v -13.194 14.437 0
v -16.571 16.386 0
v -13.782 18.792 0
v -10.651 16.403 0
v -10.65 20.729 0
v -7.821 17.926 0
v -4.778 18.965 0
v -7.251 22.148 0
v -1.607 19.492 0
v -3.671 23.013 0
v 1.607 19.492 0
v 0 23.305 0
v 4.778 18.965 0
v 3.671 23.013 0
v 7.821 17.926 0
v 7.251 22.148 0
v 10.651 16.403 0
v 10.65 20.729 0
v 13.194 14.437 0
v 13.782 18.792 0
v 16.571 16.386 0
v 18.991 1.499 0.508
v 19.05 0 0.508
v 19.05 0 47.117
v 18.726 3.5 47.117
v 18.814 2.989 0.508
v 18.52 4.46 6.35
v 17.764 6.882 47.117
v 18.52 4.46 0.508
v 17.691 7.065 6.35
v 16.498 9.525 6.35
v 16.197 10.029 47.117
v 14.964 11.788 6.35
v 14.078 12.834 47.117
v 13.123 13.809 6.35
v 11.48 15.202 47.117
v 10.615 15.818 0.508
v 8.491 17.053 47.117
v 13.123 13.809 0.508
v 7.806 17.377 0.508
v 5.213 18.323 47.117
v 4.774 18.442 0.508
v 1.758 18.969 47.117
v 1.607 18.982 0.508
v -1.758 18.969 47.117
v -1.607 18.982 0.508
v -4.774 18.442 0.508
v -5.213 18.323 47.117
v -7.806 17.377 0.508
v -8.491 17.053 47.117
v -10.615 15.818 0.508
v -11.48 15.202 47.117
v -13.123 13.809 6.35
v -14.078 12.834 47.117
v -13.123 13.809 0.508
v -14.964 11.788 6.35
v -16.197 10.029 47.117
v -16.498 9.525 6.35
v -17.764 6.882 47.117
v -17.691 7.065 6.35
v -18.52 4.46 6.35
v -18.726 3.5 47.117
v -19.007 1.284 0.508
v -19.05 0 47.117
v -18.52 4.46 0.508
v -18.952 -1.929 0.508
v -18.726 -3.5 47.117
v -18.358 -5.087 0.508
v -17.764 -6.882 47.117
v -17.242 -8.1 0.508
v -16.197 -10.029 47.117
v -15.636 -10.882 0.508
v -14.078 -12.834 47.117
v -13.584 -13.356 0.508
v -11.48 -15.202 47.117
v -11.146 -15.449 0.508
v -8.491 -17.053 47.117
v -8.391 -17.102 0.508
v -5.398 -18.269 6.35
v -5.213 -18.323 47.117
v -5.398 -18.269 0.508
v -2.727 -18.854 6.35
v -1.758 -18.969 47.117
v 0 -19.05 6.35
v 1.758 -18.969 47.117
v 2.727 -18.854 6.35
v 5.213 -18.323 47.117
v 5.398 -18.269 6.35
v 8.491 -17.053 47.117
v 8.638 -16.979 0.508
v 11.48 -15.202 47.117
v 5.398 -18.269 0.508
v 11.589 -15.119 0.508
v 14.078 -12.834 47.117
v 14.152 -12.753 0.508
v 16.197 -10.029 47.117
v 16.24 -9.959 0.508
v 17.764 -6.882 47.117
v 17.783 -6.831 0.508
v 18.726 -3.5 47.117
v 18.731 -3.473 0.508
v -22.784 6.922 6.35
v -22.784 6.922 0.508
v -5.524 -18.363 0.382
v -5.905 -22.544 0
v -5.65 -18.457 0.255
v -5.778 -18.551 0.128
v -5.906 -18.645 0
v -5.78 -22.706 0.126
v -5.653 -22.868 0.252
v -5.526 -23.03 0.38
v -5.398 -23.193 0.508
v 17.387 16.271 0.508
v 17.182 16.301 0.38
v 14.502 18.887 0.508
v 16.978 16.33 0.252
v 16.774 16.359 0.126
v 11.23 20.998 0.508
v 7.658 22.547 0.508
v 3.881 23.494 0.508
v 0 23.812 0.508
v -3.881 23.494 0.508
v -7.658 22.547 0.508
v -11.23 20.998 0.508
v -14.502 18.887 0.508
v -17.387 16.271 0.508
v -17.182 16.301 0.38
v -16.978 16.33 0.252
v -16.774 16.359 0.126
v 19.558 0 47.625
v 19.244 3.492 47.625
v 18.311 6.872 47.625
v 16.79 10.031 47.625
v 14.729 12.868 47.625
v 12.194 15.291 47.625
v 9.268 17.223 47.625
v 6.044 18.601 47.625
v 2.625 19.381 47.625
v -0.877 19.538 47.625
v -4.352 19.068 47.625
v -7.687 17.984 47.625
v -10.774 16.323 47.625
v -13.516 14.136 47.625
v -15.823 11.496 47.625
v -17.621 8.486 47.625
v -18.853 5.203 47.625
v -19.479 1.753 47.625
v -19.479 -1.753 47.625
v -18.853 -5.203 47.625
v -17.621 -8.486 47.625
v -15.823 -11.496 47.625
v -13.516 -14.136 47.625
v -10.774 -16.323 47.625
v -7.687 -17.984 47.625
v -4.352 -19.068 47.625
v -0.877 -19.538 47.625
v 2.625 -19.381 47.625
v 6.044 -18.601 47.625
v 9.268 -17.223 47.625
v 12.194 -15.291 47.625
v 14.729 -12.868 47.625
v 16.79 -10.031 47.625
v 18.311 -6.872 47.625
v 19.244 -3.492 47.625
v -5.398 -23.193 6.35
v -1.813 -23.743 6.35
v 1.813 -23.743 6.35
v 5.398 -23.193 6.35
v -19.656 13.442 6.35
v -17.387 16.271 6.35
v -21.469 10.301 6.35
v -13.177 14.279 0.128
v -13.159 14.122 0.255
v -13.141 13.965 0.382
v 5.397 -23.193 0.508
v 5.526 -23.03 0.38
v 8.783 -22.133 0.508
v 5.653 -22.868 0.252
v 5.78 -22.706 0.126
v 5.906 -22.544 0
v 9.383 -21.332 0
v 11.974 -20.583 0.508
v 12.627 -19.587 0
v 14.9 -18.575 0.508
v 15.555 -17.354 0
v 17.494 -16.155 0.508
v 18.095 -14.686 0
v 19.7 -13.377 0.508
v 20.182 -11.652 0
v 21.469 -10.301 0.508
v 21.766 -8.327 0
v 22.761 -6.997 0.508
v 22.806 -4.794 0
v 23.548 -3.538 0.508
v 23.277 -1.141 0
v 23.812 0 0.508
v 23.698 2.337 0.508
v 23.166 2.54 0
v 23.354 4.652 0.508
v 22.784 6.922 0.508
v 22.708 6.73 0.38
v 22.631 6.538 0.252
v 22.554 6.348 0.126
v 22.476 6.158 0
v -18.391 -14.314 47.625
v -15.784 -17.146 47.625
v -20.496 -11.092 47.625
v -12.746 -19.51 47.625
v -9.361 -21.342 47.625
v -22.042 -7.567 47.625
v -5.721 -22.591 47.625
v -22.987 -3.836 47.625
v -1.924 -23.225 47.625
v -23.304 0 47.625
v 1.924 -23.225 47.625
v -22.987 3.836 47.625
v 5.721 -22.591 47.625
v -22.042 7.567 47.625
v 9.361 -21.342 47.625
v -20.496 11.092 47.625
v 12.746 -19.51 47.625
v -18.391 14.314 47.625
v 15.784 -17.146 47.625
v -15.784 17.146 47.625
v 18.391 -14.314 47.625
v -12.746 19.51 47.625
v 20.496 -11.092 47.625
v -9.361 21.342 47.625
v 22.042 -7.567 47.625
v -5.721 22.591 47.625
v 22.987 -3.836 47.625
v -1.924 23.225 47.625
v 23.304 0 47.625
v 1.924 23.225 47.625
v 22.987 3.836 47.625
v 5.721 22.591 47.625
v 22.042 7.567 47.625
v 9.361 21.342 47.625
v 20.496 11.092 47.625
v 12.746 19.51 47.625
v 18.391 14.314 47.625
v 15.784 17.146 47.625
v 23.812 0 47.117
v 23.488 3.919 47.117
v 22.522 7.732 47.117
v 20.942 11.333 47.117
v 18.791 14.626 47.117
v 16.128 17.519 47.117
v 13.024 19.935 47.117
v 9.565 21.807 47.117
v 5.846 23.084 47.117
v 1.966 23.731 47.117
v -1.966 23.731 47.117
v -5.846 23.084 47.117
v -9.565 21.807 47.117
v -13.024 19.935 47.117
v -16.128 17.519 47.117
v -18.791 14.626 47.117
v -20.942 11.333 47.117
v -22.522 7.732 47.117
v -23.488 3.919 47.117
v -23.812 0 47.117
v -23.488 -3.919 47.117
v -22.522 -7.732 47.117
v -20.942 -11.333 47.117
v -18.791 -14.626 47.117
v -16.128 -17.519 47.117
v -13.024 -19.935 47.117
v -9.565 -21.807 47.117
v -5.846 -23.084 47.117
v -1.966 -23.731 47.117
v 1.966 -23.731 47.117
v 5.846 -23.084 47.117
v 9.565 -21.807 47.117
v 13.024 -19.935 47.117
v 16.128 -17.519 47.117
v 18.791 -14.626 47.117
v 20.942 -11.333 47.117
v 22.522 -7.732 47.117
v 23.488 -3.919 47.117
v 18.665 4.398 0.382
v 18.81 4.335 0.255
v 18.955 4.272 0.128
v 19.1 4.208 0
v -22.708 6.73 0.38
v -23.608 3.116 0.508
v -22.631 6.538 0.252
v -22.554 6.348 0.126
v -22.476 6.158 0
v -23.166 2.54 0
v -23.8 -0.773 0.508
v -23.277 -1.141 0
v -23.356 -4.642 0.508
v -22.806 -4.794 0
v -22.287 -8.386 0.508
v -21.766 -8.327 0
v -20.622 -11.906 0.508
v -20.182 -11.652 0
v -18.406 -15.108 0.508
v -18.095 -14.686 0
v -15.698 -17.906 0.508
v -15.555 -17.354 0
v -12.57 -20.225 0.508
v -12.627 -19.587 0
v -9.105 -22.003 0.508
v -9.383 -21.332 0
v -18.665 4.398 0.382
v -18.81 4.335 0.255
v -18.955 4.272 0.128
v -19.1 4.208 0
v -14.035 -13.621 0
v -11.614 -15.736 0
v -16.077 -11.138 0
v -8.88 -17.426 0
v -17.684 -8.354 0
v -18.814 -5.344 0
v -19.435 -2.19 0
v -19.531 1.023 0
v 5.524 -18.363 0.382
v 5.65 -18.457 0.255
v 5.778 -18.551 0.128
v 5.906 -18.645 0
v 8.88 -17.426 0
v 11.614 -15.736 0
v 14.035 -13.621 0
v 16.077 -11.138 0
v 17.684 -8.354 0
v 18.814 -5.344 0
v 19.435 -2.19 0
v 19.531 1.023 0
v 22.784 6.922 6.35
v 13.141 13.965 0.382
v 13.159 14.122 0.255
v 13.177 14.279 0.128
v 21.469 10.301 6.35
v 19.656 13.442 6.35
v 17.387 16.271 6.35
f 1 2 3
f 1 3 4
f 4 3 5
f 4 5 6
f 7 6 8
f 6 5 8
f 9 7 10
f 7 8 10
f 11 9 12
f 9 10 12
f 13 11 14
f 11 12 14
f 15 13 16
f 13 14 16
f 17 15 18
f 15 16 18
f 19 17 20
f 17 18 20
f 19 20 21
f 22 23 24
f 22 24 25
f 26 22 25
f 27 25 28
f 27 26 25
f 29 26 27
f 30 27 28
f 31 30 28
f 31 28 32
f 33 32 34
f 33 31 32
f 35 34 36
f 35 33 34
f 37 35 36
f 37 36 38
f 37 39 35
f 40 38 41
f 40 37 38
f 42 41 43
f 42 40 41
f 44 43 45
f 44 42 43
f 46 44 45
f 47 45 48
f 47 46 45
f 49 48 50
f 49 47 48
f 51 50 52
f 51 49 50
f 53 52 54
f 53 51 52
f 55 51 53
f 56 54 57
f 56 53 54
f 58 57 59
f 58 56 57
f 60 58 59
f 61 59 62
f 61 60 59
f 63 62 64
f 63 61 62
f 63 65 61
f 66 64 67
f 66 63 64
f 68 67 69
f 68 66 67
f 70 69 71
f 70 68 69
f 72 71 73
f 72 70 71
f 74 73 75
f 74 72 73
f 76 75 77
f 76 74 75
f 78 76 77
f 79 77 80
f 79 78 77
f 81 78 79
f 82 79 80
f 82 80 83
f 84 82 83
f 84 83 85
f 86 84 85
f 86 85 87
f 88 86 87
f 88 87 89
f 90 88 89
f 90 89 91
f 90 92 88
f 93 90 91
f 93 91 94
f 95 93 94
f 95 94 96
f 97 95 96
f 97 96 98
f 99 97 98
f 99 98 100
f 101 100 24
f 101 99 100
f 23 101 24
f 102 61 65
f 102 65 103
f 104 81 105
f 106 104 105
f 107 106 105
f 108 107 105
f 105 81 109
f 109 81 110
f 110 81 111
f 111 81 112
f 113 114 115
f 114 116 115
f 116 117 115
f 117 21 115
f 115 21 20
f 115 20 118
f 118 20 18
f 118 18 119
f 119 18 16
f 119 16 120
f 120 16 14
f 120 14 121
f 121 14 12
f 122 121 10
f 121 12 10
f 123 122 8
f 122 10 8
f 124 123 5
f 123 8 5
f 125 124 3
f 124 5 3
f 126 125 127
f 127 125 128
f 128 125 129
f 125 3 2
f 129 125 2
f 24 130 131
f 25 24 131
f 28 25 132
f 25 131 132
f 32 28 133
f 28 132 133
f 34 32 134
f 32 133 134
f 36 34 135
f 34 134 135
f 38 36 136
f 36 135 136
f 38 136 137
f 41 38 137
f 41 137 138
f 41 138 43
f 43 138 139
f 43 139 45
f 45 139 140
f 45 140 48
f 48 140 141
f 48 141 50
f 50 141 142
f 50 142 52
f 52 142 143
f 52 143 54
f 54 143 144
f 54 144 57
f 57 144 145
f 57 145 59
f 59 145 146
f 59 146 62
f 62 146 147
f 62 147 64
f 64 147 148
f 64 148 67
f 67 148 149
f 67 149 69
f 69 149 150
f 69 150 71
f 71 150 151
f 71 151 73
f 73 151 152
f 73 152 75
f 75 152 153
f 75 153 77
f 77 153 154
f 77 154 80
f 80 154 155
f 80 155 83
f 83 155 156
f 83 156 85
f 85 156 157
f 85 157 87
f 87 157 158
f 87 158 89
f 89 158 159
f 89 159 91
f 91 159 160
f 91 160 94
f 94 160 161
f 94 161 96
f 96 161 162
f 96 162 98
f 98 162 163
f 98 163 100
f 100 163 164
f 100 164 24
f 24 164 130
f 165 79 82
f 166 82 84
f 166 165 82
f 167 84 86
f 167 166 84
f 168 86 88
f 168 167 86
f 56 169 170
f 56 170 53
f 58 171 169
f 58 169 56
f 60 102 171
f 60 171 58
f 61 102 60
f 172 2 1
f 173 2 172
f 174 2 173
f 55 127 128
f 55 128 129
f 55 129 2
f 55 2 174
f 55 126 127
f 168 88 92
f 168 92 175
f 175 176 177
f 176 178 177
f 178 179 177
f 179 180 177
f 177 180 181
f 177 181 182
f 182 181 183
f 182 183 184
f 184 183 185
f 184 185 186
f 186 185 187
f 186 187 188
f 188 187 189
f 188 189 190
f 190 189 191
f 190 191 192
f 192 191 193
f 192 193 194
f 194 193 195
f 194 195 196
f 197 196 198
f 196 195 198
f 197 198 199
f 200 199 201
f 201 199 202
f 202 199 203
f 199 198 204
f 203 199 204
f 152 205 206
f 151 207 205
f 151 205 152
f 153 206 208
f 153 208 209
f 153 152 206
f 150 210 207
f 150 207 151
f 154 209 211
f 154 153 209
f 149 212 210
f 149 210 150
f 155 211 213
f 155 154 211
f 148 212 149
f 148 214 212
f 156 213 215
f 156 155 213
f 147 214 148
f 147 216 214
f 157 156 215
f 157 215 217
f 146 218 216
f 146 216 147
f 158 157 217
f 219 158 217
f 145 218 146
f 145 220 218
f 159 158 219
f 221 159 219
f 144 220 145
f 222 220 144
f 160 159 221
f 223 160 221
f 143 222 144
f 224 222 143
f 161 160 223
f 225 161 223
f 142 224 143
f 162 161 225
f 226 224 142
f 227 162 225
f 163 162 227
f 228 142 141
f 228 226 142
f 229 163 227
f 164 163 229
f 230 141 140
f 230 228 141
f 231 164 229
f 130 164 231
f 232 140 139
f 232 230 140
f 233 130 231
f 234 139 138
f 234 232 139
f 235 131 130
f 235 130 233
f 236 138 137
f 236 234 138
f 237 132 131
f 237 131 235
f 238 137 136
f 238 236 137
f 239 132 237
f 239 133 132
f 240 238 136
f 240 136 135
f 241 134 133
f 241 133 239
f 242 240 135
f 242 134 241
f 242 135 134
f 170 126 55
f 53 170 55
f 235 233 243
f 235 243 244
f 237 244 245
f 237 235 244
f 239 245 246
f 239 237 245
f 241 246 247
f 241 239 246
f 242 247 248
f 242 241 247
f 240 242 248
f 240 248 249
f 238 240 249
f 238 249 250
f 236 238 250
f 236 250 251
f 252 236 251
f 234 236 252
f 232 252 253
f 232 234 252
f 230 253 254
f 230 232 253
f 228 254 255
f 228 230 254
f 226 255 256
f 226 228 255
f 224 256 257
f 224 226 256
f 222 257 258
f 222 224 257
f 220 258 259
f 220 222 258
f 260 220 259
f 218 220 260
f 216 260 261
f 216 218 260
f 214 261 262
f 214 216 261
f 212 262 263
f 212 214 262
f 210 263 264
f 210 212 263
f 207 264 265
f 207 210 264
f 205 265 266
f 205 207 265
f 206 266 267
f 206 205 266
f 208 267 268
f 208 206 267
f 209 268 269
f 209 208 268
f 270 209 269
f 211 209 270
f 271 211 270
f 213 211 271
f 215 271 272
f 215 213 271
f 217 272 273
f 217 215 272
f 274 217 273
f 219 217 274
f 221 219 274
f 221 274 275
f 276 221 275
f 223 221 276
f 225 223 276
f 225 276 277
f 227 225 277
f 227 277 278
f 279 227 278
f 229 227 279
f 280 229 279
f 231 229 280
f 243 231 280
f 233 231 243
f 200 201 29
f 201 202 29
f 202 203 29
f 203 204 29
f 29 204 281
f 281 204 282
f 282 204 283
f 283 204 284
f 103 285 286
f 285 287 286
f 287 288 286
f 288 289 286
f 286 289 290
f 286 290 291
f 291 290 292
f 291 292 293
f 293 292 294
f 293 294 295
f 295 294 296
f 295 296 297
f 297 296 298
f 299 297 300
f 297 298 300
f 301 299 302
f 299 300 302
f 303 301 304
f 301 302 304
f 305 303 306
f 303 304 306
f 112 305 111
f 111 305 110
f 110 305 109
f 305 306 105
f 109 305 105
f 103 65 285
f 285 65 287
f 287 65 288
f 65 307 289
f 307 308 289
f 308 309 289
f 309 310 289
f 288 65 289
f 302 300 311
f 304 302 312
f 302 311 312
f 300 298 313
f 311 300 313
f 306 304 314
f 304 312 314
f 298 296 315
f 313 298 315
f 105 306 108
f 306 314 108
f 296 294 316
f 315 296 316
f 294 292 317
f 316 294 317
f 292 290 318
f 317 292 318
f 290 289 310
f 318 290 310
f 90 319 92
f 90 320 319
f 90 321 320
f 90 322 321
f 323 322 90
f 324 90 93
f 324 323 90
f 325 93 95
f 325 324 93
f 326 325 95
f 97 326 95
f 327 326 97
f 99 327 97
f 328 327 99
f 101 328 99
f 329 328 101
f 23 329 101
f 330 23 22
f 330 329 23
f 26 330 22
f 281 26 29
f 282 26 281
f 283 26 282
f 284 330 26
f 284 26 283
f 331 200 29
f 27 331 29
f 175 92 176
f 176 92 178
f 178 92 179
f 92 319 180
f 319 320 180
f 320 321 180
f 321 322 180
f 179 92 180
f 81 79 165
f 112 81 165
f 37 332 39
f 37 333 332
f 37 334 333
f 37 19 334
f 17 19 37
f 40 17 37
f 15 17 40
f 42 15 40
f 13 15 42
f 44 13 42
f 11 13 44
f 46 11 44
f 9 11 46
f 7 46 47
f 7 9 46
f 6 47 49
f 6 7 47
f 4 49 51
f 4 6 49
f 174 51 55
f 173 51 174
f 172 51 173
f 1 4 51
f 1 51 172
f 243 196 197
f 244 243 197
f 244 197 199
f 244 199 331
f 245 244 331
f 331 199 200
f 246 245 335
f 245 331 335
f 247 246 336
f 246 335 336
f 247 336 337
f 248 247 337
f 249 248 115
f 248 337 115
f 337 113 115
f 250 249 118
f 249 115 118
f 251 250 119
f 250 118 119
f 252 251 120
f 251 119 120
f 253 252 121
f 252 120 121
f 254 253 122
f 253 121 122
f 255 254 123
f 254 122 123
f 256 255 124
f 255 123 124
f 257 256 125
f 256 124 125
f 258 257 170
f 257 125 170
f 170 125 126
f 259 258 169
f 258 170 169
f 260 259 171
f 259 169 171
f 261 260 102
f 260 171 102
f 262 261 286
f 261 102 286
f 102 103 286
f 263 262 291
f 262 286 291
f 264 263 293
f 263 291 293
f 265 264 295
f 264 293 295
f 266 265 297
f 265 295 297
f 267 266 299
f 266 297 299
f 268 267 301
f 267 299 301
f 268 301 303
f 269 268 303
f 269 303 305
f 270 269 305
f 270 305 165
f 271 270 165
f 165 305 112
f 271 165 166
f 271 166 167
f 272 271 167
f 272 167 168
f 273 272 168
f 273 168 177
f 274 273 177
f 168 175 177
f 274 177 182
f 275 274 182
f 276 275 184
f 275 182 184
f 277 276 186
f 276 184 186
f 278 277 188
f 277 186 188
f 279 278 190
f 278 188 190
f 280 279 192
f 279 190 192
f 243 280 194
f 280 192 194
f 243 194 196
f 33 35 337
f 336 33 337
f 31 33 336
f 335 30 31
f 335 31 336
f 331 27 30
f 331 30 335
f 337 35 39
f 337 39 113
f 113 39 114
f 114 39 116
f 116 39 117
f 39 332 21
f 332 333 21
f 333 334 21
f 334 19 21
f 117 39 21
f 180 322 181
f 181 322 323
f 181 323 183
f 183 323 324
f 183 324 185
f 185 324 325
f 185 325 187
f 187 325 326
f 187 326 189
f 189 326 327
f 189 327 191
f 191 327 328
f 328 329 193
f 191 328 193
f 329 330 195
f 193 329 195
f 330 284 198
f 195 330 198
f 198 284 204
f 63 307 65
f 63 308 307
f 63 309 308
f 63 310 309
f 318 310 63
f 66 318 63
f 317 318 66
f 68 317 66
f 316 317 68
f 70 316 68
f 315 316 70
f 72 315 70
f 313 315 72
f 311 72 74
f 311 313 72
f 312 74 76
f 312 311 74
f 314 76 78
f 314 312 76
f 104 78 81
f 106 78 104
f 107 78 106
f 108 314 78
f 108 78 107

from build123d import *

# Parameters (mm, degrees)
F0_R     = 23.8125
F0_R_2   = 19.05
F1_DEPTH = 47.625
F2_W     = 10.795
F2_H     = 5.5431405764
F3_DEPTH = 6.35
F4_SIZE  = 0.508


with BuildPart() as f1:
    # F0 (on Top) → F1 (new body)
    with BuildSketch(Plane.XY):
        Circle(F0_R)
        Circle(F0_R_2, mode=Mode.SUBTRACT)
    extrude(amount=F1_DEPTH)

    # F2 (on face) → F3 (cut)
    with BuildSketch(Plane(origin=(0, 0, 0), x_dir=(1, 0, 0), z_dir=(0, 0, -1))):
        with Locations((0, 21.0409297118)):
            Rectangle(F2_W, F2_H)
        Polygon((-23.3209799276, -7.2318778831), (-17.9234799276, -16.5806221169), (-13.1229793717, -13.8090518287), (-18.5204793717, -4.4603075949), align=None)
        Polygon((17.9234799276, -16.5806221169), (23.3209799276, -7.2318778831), (18.5204793717, -4.4603075949), (13.1229793717, -13.8090518287), align=None)
    extrude(amount=-F3_DEPTH, mode=Mode.SUBTRACT)

    # F4
    f4_edges = [f1.edges().sort_by_distance(p)[0] for p in [
        (-23.8125, 0, 47.625),
        (-19.05, 0, 47.625),
        (-16.497784, -9.525, 0),
        (-20.62223, -11.90625, 0),
        (18.648902, -14.807214, 0),
        (15.259831, -11.403511, 0),
        (0, 19.05, 0),
        (0, 23.8125, 0),
        (-20.652356, 5.691147, 0),
        (-5.3975, -20.731039, 0),
        (5.3975, -20.731039, 0),
        (20.652356, 5.691147, 0),
        (15.254856, 15.039891, 0),
        (-15.254856, 15.039891, 0),
    ]]
    chamfer(f4_edges, length=F4_SIZE)


solid = f1.part
